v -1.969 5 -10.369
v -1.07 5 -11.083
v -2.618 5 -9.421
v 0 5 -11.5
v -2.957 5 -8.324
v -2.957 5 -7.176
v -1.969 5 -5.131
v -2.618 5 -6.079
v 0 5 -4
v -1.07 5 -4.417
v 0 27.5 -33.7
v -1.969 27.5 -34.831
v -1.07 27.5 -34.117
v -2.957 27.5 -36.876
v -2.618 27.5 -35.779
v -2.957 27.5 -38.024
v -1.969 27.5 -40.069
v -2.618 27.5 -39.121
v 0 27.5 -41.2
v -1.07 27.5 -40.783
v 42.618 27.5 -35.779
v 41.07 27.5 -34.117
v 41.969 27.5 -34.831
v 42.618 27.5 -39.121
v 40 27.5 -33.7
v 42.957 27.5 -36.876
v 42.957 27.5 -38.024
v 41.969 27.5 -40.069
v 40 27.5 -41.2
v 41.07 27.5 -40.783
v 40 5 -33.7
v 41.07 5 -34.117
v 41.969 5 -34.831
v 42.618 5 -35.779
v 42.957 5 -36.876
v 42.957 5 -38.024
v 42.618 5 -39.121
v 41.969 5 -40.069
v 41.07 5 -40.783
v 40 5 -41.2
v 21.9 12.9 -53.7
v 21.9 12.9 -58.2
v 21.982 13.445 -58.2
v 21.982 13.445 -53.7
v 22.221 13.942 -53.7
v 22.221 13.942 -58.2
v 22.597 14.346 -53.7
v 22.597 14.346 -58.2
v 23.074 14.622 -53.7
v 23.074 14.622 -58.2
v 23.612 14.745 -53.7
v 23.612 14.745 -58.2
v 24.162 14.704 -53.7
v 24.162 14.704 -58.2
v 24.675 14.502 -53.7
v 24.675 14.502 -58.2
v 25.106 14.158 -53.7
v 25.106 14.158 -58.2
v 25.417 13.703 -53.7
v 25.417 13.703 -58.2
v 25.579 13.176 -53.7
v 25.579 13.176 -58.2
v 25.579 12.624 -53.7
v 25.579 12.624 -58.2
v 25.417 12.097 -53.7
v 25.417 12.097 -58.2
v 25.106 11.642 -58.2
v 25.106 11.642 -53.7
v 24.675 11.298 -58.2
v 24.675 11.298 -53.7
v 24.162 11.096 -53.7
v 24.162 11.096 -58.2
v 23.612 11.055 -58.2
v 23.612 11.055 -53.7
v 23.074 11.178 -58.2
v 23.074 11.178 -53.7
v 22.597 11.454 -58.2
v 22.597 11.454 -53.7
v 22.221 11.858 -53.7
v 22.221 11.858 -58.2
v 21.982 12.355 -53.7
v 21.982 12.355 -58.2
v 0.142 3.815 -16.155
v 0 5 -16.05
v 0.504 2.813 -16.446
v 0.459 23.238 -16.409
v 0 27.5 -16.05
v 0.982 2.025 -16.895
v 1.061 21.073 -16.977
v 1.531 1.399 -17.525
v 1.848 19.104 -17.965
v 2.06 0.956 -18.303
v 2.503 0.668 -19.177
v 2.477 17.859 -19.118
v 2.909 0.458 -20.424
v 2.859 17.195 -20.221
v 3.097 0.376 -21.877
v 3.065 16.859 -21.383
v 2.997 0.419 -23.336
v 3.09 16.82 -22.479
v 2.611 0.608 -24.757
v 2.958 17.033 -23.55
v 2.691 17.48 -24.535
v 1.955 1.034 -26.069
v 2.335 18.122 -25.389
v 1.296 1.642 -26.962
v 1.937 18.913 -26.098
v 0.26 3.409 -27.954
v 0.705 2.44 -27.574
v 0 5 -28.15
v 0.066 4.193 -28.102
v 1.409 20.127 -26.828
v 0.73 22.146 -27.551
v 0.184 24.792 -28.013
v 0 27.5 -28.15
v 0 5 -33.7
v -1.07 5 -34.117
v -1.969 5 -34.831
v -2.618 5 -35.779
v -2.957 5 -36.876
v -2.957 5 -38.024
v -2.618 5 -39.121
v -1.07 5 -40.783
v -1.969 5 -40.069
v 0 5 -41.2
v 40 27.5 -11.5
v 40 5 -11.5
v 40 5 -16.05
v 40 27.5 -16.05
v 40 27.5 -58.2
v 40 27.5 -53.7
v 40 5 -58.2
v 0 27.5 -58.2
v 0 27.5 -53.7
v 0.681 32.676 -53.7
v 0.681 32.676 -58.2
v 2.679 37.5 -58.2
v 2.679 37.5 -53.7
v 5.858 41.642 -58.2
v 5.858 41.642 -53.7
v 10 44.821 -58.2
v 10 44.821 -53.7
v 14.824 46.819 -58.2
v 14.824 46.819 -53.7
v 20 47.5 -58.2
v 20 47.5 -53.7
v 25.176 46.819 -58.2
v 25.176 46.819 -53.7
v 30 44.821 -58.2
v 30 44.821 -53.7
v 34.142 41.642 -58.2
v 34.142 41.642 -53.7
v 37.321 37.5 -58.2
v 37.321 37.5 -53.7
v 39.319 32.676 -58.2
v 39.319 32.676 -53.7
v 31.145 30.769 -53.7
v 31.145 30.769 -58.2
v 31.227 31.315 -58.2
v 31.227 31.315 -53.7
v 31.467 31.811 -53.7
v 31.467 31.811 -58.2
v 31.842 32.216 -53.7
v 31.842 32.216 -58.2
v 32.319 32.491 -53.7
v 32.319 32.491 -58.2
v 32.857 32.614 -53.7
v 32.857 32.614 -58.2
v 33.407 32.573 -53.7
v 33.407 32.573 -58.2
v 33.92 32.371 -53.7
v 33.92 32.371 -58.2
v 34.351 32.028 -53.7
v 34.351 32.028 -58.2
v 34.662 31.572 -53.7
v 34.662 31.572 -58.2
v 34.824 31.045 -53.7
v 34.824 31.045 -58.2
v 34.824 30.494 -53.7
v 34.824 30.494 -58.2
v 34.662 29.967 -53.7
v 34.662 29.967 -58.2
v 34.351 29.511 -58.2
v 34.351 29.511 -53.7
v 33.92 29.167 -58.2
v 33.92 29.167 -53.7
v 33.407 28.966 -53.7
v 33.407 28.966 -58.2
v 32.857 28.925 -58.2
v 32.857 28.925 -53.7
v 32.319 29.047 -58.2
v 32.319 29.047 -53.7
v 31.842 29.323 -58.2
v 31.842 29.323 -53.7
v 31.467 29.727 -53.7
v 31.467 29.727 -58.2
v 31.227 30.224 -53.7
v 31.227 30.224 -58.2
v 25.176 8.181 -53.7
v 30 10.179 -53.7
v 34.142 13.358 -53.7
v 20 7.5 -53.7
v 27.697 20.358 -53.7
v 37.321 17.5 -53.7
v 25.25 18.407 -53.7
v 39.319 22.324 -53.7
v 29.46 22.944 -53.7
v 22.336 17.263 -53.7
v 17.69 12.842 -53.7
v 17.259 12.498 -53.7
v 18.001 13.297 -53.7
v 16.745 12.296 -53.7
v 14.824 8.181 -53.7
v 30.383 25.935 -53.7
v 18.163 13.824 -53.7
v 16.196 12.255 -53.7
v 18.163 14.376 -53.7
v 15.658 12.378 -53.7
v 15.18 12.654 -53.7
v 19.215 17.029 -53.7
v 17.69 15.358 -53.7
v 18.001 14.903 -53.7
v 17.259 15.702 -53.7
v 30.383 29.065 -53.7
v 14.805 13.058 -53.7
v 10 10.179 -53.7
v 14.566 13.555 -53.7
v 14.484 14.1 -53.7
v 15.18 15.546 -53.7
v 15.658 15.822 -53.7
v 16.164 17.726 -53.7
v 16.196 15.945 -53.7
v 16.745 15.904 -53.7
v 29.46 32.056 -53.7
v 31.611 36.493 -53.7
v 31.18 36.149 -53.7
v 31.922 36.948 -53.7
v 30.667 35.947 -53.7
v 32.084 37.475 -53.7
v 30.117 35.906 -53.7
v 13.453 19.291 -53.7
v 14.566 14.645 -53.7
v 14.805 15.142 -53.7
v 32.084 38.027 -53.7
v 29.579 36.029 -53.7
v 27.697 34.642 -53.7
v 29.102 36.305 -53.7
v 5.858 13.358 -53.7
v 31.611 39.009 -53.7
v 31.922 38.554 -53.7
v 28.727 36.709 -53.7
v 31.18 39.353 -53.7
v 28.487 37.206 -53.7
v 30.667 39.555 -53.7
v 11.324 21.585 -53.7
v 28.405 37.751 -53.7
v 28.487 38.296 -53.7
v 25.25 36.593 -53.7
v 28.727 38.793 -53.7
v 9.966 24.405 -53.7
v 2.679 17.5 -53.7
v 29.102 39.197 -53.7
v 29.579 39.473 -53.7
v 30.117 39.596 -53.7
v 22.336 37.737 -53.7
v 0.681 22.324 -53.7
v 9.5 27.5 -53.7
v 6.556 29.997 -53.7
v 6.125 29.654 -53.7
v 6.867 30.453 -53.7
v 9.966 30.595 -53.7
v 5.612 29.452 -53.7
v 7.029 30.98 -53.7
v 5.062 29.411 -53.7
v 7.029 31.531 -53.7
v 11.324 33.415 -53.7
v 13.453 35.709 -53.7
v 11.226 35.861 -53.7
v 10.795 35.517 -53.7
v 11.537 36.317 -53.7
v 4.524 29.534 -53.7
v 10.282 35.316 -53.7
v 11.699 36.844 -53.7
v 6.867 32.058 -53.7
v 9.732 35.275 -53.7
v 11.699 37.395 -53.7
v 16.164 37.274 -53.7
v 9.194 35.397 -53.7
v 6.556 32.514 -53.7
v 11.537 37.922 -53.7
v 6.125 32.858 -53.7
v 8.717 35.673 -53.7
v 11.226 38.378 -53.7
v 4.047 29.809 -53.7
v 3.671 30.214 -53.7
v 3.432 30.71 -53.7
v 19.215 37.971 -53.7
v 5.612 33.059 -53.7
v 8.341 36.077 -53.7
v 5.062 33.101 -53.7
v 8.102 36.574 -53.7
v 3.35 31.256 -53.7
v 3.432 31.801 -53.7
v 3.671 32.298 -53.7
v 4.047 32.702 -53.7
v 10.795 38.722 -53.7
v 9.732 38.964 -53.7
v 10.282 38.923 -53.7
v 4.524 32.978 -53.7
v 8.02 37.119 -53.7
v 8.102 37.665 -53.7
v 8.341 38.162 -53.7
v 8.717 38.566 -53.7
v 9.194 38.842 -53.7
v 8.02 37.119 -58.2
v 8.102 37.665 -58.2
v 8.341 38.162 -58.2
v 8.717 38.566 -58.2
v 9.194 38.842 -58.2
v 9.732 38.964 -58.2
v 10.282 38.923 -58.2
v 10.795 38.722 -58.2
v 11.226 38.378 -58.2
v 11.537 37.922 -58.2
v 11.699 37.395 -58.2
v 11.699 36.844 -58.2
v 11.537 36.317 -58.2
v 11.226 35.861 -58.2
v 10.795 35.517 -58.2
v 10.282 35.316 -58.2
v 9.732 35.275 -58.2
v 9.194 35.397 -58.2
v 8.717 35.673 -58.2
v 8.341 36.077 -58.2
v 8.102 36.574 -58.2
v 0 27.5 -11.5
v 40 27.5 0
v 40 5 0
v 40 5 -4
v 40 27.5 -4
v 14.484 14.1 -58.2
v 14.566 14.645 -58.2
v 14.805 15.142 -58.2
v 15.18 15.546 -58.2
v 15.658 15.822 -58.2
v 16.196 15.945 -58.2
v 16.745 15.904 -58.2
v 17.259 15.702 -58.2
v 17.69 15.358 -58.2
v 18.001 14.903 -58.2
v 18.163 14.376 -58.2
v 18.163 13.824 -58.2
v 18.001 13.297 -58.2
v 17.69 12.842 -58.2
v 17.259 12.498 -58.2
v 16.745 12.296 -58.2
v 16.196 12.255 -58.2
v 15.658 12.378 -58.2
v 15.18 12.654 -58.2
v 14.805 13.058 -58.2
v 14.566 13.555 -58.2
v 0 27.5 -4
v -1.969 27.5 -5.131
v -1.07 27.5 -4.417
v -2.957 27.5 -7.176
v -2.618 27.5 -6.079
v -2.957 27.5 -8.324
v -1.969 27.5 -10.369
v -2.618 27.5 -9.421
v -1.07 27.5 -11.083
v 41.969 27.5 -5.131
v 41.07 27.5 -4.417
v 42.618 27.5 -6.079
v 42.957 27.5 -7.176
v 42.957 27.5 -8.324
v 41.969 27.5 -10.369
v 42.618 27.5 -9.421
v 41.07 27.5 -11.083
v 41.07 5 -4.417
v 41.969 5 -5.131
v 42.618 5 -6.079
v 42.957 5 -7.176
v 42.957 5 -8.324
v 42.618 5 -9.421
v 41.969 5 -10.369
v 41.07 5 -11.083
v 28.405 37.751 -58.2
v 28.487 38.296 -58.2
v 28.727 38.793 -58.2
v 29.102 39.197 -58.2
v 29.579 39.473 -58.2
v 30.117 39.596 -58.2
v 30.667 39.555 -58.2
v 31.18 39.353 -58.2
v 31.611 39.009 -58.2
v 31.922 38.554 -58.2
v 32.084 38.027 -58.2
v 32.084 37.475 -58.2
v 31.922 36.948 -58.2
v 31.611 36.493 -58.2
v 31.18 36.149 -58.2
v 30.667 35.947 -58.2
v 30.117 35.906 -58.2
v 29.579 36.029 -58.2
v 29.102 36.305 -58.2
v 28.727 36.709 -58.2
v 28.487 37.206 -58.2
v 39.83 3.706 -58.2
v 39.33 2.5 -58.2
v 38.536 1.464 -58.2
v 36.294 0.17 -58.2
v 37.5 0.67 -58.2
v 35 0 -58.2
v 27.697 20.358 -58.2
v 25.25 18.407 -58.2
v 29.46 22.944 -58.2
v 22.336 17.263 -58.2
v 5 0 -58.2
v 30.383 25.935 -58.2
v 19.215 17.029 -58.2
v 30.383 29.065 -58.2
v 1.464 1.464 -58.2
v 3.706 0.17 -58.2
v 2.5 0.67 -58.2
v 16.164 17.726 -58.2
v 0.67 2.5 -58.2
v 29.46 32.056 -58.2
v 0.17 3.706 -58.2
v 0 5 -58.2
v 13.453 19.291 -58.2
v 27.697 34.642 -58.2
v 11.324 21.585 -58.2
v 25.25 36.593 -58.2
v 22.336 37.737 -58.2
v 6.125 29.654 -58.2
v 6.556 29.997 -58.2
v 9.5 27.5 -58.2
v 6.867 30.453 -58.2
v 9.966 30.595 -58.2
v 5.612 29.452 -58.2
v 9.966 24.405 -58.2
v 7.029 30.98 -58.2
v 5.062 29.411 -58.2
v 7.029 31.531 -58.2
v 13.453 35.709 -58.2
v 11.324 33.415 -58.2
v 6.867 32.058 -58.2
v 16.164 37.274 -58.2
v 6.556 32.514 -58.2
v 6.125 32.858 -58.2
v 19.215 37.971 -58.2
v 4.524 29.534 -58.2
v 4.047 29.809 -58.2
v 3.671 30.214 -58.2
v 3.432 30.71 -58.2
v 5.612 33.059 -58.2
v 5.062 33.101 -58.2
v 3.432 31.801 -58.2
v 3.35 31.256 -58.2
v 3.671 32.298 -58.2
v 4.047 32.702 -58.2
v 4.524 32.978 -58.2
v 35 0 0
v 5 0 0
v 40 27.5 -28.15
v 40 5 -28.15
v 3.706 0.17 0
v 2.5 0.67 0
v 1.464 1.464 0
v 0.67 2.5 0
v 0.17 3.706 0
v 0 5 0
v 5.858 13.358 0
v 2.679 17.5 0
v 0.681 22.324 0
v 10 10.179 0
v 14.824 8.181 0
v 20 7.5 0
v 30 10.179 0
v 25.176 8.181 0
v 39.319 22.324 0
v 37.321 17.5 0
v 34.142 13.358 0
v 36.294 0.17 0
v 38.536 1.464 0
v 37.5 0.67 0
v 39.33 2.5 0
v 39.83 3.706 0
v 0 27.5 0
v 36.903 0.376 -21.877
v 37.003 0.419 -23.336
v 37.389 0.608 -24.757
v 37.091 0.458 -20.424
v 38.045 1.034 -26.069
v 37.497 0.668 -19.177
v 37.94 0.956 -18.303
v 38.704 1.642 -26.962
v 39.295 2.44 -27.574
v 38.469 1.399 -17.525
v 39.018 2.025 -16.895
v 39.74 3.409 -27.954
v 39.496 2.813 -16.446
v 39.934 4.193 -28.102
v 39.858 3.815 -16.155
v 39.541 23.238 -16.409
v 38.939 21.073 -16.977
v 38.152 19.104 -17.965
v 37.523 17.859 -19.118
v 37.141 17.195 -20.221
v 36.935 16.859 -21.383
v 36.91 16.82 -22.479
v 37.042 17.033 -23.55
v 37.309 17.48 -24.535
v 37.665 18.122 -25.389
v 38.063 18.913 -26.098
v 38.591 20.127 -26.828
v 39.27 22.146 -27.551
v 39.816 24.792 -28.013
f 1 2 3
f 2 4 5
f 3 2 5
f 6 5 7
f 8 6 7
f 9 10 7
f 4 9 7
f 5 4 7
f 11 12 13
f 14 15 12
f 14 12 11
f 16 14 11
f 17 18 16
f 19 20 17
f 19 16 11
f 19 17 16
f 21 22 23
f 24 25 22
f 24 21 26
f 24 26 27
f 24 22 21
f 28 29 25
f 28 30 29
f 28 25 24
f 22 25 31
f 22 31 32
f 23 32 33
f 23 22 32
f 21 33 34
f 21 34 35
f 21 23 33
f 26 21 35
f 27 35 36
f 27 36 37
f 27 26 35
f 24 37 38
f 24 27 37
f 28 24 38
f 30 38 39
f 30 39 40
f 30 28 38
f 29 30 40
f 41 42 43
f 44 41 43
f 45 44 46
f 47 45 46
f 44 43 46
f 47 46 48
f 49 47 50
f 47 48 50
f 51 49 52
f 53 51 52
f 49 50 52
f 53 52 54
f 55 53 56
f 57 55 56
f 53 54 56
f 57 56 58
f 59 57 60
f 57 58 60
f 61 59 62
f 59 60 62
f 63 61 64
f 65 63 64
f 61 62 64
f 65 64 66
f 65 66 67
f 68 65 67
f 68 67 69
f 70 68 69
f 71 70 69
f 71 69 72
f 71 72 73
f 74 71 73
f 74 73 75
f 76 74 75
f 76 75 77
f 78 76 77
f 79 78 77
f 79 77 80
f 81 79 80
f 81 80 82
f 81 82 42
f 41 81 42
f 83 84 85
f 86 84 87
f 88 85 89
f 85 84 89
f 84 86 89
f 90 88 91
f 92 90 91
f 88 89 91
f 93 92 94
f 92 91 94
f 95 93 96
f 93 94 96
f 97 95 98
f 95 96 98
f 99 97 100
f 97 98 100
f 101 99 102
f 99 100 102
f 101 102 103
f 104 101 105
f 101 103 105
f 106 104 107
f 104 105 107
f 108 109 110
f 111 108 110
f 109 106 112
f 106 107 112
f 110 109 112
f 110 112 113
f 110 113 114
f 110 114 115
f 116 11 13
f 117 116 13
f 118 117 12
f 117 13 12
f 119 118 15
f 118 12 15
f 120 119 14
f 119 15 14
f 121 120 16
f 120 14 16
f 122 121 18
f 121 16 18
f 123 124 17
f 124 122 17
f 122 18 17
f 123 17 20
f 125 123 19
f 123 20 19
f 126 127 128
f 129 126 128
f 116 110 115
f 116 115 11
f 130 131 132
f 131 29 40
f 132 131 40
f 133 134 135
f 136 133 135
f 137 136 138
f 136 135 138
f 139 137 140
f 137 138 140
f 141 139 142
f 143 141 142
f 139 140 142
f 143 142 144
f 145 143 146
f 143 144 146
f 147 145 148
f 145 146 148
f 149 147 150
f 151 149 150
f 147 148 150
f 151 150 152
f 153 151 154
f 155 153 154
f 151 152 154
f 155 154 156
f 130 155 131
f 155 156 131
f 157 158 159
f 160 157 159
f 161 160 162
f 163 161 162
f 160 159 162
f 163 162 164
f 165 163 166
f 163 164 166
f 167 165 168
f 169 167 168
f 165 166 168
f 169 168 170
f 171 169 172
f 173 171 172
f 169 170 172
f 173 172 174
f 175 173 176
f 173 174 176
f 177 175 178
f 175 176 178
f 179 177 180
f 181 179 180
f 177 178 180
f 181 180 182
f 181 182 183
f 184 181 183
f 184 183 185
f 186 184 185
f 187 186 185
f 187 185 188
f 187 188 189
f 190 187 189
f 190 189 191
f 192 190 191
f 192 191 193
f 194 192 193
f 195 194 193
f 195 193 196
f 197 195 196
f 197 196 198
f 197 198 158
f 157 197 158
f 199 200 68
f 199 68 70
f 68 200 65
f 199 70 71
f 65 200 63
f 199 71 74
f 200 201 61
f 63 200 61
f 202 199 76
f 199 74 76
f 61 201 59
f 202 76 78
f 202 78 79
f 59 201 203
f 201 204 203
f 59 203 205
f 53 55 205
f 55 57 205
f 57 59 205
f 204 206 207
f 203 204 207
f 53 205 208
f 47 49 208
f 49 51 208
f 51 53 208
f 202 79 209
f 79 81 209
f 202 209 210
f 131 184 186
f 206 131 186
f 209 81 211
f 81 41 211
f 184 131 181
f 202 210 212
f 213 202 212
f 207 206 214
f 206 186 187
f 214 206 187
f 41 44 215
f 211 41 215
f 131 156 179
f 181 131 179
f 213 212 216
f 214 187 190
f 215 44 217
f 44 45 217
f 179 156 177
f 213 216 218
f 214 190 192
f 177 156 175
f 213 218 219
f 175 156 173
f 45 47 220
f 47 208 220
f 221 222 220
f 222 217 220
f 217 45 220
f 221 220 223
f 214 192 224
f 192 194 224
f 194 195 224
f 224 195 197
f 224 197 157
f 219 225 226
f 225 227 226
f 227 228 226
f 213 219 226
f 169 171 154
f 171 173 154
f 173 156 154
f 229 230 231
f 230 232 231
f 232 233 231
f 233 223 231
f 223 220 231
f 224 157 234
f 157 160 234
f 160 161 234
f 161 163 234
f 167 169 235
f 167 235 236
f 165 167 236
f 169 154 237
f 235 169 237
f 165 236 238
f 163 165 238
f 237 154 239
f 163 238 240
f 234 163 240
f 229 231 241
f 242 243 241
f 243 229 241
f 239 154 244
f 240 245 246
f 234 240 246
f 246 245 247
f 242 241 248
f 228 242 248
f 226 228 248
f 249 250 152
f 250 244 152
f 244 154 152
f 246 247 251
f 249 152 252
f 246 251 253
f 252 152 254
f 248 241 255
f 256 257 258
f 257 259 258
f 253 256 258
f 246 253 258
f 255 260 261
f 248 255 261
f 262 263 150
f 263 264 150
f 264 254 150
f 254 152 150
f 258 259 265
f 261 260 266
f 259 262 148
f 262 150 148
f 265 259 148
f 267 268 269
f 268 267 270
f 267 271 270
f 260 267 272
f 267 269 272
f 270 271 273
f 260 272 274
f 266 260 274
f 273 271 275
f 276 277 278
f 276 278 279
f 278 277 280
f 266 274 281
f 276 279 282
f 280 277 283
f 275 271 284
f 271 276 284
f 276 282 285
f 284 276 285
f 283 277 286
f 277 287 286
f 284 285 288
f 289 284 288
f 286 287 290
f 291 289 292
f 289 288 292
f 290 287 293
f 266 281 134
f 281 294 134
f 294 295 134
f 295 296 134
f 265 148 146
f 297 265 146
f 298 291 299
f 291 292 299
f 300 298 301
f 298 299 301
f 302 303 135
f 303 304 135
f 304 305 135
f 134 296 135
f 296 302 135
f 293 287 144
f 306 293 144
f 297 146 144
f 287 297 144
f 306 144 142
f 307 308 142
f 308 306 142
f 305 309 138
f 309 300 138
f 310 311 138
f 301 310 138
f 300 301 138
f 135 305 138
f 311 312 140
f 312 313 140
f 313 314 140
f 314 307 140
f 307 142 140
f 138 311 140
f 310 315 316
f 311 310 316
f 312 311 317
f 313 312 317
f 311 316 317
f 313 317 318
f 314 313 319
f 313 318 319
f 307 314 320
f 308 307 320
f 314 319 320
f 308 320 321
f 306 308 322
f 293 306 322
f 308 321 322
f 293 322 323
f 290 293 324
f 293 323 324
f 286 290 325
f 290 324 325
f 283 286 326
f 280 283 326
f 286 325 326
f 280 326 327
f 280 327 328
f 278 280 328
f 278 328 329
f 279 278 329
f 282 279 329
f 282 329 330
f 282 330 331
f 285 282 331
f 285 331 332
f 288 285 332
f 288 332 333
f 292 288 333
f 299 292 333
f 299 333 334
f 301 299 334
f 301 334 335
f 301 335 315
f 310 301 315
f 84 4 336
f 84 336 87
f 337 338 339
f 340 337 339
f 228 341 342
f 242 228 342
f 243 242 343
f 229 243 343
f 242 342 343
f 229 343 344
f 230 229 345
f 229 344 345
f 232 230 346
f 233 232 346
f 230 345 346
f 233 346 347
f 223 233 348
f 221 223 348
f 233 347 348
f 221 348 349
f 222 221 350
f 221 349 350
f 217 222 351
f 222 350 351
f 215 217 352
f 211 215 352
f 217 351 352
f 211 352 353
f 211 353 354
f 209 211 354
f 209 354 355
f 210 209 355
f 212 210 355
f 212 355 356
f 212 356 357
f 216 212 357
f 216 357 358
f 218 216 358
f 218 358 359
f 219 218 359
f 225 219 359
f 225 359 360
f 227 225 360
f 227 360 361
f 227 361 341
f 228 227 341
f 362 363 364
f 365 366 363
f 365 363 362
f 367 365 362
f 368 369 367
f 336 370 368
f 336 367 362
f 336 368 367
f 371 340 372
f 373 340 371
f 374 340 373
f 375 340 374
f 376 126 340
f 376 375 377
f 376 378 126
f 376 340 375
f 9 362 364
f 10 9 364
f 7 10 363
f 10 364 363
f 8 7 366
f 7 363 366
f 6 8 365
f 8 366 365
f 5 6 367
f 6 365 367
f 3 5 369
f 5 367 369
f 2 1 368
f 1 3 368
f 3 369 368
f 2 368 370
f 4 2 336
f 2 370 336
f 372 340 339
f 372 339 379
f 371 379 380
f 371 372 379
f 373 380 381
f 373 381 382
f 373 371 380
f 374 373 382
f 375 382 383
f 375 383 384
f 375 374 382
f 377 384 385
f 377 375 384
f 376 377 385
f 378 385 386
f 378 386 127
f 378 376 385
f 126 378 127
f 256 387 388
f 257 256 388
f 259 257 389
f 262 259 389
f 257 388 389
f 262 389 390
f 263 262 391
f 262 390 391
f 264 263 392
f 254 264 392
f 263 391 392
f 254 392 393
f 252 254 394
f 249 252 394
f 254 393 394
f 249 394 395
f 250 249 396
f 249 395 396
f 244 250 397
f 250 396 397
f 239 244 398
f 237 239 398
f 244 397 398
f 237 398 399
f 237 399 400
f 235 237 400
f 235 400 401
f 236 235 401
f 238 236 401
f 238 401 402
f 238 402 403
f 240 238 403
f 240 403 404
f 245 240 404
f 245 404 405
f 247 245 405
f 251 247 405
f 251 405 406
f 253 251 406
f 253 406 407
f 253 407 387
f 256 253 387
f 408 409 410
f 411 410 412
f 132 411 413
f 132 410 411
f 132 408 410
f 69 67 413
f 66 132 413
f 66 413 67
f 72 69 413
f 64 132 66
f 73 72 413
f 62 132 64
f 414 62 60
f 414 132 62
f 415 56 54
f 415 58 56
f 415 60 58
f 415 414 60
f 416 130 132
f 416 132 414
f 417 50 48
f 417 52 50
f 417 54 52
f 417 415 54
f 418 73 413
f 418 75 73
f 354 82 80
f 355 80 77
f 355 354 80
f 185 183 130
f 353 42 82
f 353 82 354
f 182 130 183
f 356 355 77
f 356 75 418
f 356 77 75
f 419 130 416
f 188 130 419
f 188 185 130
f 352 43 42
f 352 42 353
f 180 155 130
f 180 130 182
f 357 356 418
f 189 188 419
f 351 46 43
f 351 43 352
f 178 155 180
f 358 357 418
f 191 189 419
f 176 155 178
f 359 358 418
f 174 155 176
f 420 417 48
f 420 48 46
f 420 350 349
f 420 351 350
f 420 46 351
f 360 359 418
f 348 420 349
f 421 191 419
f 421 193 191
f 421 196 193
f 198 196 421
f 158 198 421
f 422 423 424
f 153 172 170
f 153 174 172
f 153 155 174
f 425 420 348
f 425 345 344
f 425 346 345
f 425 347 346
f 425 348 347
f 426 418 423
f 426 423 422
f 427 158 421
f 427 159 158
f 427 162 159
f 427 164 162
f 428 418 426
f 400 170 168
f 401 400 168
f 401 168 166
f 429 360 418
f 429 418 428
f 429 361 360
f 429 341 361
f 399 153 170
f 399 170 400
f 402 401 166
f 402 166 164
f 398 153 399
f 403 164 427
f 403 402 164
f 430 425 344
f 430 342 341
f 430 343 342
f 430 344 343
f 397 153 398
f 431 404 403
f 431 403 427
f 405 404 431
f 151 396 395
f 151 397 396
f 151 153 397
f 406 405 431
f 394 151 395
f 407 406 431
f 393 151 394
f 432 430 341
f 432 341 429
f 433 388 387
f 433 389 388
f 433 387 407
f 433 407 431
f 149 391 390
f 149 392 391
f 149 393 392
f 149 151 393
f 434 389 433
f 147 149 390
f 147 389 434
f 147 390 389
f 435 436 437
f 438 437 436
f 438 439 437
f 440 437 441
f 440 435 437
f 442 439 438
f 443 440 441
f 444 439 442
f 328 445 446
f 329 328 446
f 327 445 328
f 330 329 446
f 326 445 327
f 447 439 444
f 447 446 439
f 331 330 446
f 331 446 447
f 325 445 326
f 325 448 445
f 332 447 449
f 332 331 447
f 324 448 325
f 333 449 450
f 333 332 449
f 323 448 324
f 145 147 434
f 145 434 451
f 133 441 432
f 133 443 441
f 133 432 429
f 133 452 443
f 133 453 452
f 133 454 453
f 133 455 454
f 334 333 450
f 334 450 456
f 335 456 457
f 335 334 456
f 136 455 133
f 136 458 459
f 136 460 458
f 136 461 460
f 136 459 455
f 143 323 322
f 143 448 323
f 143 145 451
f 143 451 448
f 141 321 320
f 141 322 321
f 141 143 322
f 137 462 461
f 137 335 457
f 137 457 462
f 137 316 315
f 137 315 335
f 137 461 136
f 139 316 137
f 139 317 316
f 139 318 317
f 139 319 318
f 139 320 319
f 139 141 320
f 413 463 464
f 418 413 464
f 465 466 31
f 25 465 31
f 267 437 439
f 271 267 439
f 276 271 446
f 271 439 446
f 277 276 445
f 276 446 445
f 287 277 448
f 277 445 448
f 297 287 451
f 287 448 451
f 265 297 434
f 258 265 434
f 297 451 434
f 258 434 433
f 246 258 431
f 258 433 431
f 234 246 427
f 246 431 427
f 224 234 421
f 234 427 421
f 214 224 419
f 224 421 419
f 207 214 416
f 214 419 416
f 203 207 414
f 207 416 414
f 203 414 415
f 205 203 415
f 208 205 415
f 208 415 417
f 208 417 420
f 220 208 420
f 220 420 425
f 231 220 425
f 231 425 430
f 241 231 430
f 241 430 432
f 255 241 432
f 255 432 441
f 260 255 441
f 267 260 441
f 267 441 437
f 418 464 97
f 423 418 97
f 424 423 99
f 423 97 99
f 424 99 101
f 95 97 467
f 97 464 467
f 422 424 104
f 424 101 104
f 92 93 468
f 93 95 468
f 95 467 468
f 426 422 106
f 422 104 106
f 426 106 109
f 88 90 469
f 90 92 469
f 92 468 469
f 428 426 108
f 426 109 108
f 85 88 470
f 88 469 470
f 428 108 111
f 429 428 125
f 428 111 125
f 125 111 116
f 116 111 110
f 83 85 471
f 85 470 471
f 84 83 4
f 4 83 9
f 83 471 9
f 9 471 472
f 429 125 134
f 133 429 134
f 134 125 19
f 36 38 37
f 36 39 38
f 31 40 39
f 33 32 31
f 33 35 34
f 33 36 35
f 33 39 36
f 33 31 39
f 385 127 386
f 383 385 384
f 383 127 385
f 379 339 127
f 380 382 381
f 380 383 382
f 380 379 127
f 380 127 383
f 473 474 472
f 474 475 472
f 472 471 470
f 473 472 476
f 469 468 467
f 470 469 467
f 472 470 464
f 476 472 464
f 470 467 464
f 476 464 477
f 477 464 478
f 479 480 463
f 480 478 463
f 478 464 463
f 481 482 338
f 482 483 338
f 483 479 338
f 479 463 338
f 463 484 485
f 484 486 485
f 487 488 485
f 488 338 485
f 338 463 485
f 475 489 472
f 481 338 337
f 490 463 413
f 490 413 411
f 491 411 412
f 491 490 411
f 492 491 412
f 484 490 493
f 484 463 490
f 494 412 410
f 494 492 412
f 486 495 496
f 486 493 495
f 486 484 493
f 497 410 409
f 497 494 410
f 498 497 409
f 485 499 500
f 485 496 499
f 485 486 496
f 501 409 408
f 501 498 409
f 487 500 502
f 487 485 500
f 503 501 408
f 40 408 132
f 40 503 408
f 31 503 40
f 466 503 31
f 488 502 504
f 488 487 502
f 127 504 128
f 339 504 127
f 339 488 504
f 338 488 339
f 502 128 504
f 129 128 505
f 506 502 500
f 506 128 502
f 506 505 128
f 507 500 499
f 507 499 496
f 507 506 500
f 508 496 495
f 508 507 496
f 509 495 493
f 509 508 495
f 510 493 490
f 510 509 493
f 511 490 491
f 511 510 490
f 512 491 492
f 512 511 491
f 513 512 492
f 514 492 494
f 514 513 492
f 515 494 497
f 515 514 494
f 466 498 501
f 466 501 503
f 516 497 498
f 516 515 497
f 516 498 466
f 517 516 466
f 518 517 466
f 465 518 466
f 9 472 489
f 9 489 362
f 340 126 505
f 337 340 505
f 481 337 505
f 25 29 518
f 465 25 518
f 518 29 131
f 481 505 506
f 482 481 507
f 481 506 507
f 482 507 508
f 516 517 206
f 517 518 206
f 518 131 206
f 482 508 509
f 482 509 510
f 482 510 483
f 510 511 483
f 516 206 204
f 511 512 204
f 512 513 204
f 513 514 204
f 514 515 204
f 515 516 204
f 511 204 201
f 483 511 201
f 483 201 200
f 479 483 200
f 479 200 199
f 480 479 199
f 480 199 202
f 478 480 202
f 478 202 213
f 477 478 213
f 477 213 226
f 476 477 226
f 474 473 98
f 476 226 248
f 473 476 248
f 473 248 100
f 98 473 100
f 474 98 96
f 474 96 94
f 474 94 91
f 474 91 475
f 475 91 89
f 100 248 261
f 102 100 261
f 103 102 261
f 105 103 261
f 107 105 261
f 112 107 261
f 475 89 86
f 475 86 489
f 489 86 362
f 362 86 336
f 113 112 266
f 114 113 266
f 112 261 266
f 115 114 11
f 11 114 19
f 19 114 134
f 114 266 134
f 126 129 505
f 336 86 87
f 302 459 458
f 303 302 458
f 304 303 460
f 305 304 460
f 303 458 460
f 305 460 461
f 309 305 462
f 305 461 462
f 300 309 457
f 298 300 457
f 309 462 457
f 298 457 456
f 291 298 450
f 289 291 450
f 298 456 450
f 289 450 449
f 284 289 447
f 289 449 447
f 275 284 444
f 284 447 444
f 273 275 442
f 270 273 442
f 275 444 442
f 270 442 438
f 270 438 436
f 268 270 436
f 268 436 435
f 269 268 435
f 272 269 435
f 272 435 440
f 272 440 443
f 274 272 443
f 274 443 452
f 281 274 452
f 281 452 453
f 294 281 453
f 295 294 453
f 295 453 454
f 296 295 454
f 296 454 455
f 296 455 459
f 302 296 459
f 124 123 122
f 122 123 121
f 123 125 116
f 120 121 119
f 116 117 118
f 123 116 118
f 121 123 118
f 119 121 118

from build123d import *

# Parameters (mm, degrees)
SKETCH3_W           = 40
SKETCH3_H           = 53.7
BOSS_EXTRUDE1_DEPTH = 27.5
BOSS_EXTRUDE4_DEPTH = 27.5
CUT_EXTRUDE1_DEPTH  = 28.5
SKETCH7_R           = 20
CUT_EXTRUDE2_DEPTH  = 54.7
BOSS_EXTRUDE5_DEPTH = 4.5
SKETCH9_R           = 10.5
CUT_EXTRUDE3_DEPTH  = 59.2000001
SKETCH10_R          = 1.85
CUT_EXTRUDE4_DEPTH  = 59.2000001
CUT_EXTRUDE5_DEPTH  = 59.2
CUT_EXTRUDE7_DEPTH  = 59.2000001


with BuildPart() as part:
    # Sketch3 → Boss-Extrude1 (new body)
    with BuildSketch(Plane(origin=(0, 0, 0), x_dir=(1, 0, 0), z_dir=(0, 1, 0))):
        with Locations((20, 26.85)):
            Rectangle(SKETCH3_W, SKETCH3_H)
    extrude(amount=BOSS_EXTRUDE1_DEPTH)

    # Sketch4 → Boss-Extrude4 (add)
    with BuildSketch(Plane(origin=(0, 27.5, 0), x_dir=(1, 0, 0), z_dir=(0, 1, 0))):
        with BuildLine():
            Line((0, 41.2), (0, 33.7))
            ThreePointArc((0, 33.7), (-2.999999474, 37.45), (0, 41.2))
        make_face()
        with BuildLine():
            Line((0, 11.5), (0, 4))
            ThreePointArc((0, 4), (-2.999999474, 7.75), (0, 11.5))
        make_face()
        with BuildLine():
            Line((40, 41.2), (40, 33.7))
            ThreePointArc((40, 33.7), (42.999999474, 37.45), (40, 41.2))
        make_face()
        with BuildLine():
            Line((40, 11.5), (40, 4))
            ThreePointArc((40, 4), (42.999999474, 7.75), (40, 11.5))
        make_face()
    extrude(amount=-BOSS_EXTRUDE4_DEPTH)

    # Sketch6 → Cut-Extrude1 (cut, through all)
    with BuildSketch(Plane(origin=(0, 27.5, 0), x_dir=(1, 0, 0), z_dir=(0, 1, 0))):
        with BuildLine():
            Line((0, 28.15), (0, 16.05))
            ThreePointArc((0, 16.05), (3.100001365, 22.1), (0, 28.15))
        make_face()
        with BuildLine():
            Line((40, 28.15), (40, 16.05))
            ThreePointArc((40, 16.05), (36.899998635, 22.1), (40, 28.15))
        make_face()
    extrude(amount=-CUT_EXTRUDE1_DEPTH, mode=Mode.SUBTRACT)

    # Sketch7 → Cut-Extrude2 (cut, through all)
    with BuildSketch(Plane(origin=(0, 0, -53.7), x_dir=(-1, 0, 0), z_dir=(0, 0, -1))):
        with Locations((-20, 27.5)):
            Circle(SKETCH7_R)
    extrude(amount=-CUT_EXTRUDE2_DEPTH, mode=Mode.SUBTRACT)

    # Sketch8 → Boss-Extrude5 (add)
    with BuildSketch(Plane(origin=(0, 0, -53.7), x_dir=(-1, 0, 0), z_dir=(0, 0, -1))):
        with BuildLine():
            Line((-40, 27.5), (-40, 0))
            Line((-40, 0), (0, 0))
            Line((0, 0), (0, 27.5))
            ThreePointArc((0, 27.5), (-20, 47.5), (-40, 27.5))
        make_face()
    extrude(amount=BOSS_EXTRUDE5_DEPTH)

    # Sketch9 → Cut-Extrude3 (cut, through all)
    with BuildSketch(Plane(origin=(0, 0, -58.2), x_dir=(-1, 0, 0), z_dir=(0, 0, -1))):
        with Locations((-20, 27.5)):
            Circle(SKETCH9_R)
    extrude(amount=-CUT_EXTRUDE3_DEPTH, mode=Mode.SUBTRACT)

    # Sketch10 → Cut-Extrude4 (cut, through all)
    with BuildSketch(Plane(origin=(0, 0, -58.2), x_dir=(-1, 0, 0), z_dir=(0, 0, -1))):
        with Locations((-23.75, 12.9)):
            Circle(SKETCH10_R)
        with Locations((-16.333793604, 14.1)):
            Circle(SKETCH10_R)
        with Locations((-32.995056342, 30.769328778)):
            Circle(SKETCH10_R)
        with Locations((-30.255153544, 37.750942678)):
            Circle(SKETCH10_R)
        with Locations((-9.87, 37.119384527)):
            Circle(SKETCH10_R)
        with Locations((-5.2, 31.25575215)):
            Circle(SKETCH10_R)
    extrude(amount=-CUT_EXTRUDE4_DEPTH, mode=Mode.SUBTRACT)

    # Sketch11 → Cut-Extrude5 (cut, through all)
    with BuildSketch(Plane.XY):
        with BuildLine():
            Line((40, 5), (45.647961317, 5))
            Line((45.647961317, 5), (45.647961317, -3.041494826))
            Line((45.647961317, -3.041494826), (35, -3.041494826))
            Line((35, -3.041494826), (35, 0))
            ThreePointArc((35, 0), (38.535533906, 1.464466094), (40, 5))
        make_face()
    extrude(amount=-CUT_EXTRUDE5_DEPTH, mode=Mode.SUBTRACT)

    # Sketch12 → Cut-Extrude7 (cut, through all)
    with BuildSketch(Plane.XY):
        with BuildLine():
            Line((0, 5), (-3.969490024, 5))
            Line((-3.969490024, 5), (-3.969490024, -1.478021918))
            Line((-3.969490024, -1.478021918), (5, -1.478021918))
            Line((5, -1.478021918), (5, 0))
            ThreePointArc((5, 0), (1.464466094, 1.464466094), (0, 5))
        make_face()
    extrude(amount=-CUT_EXTRUDE7_DEPTH, mode=Mode.SUBTRACT)


solid = part.part
